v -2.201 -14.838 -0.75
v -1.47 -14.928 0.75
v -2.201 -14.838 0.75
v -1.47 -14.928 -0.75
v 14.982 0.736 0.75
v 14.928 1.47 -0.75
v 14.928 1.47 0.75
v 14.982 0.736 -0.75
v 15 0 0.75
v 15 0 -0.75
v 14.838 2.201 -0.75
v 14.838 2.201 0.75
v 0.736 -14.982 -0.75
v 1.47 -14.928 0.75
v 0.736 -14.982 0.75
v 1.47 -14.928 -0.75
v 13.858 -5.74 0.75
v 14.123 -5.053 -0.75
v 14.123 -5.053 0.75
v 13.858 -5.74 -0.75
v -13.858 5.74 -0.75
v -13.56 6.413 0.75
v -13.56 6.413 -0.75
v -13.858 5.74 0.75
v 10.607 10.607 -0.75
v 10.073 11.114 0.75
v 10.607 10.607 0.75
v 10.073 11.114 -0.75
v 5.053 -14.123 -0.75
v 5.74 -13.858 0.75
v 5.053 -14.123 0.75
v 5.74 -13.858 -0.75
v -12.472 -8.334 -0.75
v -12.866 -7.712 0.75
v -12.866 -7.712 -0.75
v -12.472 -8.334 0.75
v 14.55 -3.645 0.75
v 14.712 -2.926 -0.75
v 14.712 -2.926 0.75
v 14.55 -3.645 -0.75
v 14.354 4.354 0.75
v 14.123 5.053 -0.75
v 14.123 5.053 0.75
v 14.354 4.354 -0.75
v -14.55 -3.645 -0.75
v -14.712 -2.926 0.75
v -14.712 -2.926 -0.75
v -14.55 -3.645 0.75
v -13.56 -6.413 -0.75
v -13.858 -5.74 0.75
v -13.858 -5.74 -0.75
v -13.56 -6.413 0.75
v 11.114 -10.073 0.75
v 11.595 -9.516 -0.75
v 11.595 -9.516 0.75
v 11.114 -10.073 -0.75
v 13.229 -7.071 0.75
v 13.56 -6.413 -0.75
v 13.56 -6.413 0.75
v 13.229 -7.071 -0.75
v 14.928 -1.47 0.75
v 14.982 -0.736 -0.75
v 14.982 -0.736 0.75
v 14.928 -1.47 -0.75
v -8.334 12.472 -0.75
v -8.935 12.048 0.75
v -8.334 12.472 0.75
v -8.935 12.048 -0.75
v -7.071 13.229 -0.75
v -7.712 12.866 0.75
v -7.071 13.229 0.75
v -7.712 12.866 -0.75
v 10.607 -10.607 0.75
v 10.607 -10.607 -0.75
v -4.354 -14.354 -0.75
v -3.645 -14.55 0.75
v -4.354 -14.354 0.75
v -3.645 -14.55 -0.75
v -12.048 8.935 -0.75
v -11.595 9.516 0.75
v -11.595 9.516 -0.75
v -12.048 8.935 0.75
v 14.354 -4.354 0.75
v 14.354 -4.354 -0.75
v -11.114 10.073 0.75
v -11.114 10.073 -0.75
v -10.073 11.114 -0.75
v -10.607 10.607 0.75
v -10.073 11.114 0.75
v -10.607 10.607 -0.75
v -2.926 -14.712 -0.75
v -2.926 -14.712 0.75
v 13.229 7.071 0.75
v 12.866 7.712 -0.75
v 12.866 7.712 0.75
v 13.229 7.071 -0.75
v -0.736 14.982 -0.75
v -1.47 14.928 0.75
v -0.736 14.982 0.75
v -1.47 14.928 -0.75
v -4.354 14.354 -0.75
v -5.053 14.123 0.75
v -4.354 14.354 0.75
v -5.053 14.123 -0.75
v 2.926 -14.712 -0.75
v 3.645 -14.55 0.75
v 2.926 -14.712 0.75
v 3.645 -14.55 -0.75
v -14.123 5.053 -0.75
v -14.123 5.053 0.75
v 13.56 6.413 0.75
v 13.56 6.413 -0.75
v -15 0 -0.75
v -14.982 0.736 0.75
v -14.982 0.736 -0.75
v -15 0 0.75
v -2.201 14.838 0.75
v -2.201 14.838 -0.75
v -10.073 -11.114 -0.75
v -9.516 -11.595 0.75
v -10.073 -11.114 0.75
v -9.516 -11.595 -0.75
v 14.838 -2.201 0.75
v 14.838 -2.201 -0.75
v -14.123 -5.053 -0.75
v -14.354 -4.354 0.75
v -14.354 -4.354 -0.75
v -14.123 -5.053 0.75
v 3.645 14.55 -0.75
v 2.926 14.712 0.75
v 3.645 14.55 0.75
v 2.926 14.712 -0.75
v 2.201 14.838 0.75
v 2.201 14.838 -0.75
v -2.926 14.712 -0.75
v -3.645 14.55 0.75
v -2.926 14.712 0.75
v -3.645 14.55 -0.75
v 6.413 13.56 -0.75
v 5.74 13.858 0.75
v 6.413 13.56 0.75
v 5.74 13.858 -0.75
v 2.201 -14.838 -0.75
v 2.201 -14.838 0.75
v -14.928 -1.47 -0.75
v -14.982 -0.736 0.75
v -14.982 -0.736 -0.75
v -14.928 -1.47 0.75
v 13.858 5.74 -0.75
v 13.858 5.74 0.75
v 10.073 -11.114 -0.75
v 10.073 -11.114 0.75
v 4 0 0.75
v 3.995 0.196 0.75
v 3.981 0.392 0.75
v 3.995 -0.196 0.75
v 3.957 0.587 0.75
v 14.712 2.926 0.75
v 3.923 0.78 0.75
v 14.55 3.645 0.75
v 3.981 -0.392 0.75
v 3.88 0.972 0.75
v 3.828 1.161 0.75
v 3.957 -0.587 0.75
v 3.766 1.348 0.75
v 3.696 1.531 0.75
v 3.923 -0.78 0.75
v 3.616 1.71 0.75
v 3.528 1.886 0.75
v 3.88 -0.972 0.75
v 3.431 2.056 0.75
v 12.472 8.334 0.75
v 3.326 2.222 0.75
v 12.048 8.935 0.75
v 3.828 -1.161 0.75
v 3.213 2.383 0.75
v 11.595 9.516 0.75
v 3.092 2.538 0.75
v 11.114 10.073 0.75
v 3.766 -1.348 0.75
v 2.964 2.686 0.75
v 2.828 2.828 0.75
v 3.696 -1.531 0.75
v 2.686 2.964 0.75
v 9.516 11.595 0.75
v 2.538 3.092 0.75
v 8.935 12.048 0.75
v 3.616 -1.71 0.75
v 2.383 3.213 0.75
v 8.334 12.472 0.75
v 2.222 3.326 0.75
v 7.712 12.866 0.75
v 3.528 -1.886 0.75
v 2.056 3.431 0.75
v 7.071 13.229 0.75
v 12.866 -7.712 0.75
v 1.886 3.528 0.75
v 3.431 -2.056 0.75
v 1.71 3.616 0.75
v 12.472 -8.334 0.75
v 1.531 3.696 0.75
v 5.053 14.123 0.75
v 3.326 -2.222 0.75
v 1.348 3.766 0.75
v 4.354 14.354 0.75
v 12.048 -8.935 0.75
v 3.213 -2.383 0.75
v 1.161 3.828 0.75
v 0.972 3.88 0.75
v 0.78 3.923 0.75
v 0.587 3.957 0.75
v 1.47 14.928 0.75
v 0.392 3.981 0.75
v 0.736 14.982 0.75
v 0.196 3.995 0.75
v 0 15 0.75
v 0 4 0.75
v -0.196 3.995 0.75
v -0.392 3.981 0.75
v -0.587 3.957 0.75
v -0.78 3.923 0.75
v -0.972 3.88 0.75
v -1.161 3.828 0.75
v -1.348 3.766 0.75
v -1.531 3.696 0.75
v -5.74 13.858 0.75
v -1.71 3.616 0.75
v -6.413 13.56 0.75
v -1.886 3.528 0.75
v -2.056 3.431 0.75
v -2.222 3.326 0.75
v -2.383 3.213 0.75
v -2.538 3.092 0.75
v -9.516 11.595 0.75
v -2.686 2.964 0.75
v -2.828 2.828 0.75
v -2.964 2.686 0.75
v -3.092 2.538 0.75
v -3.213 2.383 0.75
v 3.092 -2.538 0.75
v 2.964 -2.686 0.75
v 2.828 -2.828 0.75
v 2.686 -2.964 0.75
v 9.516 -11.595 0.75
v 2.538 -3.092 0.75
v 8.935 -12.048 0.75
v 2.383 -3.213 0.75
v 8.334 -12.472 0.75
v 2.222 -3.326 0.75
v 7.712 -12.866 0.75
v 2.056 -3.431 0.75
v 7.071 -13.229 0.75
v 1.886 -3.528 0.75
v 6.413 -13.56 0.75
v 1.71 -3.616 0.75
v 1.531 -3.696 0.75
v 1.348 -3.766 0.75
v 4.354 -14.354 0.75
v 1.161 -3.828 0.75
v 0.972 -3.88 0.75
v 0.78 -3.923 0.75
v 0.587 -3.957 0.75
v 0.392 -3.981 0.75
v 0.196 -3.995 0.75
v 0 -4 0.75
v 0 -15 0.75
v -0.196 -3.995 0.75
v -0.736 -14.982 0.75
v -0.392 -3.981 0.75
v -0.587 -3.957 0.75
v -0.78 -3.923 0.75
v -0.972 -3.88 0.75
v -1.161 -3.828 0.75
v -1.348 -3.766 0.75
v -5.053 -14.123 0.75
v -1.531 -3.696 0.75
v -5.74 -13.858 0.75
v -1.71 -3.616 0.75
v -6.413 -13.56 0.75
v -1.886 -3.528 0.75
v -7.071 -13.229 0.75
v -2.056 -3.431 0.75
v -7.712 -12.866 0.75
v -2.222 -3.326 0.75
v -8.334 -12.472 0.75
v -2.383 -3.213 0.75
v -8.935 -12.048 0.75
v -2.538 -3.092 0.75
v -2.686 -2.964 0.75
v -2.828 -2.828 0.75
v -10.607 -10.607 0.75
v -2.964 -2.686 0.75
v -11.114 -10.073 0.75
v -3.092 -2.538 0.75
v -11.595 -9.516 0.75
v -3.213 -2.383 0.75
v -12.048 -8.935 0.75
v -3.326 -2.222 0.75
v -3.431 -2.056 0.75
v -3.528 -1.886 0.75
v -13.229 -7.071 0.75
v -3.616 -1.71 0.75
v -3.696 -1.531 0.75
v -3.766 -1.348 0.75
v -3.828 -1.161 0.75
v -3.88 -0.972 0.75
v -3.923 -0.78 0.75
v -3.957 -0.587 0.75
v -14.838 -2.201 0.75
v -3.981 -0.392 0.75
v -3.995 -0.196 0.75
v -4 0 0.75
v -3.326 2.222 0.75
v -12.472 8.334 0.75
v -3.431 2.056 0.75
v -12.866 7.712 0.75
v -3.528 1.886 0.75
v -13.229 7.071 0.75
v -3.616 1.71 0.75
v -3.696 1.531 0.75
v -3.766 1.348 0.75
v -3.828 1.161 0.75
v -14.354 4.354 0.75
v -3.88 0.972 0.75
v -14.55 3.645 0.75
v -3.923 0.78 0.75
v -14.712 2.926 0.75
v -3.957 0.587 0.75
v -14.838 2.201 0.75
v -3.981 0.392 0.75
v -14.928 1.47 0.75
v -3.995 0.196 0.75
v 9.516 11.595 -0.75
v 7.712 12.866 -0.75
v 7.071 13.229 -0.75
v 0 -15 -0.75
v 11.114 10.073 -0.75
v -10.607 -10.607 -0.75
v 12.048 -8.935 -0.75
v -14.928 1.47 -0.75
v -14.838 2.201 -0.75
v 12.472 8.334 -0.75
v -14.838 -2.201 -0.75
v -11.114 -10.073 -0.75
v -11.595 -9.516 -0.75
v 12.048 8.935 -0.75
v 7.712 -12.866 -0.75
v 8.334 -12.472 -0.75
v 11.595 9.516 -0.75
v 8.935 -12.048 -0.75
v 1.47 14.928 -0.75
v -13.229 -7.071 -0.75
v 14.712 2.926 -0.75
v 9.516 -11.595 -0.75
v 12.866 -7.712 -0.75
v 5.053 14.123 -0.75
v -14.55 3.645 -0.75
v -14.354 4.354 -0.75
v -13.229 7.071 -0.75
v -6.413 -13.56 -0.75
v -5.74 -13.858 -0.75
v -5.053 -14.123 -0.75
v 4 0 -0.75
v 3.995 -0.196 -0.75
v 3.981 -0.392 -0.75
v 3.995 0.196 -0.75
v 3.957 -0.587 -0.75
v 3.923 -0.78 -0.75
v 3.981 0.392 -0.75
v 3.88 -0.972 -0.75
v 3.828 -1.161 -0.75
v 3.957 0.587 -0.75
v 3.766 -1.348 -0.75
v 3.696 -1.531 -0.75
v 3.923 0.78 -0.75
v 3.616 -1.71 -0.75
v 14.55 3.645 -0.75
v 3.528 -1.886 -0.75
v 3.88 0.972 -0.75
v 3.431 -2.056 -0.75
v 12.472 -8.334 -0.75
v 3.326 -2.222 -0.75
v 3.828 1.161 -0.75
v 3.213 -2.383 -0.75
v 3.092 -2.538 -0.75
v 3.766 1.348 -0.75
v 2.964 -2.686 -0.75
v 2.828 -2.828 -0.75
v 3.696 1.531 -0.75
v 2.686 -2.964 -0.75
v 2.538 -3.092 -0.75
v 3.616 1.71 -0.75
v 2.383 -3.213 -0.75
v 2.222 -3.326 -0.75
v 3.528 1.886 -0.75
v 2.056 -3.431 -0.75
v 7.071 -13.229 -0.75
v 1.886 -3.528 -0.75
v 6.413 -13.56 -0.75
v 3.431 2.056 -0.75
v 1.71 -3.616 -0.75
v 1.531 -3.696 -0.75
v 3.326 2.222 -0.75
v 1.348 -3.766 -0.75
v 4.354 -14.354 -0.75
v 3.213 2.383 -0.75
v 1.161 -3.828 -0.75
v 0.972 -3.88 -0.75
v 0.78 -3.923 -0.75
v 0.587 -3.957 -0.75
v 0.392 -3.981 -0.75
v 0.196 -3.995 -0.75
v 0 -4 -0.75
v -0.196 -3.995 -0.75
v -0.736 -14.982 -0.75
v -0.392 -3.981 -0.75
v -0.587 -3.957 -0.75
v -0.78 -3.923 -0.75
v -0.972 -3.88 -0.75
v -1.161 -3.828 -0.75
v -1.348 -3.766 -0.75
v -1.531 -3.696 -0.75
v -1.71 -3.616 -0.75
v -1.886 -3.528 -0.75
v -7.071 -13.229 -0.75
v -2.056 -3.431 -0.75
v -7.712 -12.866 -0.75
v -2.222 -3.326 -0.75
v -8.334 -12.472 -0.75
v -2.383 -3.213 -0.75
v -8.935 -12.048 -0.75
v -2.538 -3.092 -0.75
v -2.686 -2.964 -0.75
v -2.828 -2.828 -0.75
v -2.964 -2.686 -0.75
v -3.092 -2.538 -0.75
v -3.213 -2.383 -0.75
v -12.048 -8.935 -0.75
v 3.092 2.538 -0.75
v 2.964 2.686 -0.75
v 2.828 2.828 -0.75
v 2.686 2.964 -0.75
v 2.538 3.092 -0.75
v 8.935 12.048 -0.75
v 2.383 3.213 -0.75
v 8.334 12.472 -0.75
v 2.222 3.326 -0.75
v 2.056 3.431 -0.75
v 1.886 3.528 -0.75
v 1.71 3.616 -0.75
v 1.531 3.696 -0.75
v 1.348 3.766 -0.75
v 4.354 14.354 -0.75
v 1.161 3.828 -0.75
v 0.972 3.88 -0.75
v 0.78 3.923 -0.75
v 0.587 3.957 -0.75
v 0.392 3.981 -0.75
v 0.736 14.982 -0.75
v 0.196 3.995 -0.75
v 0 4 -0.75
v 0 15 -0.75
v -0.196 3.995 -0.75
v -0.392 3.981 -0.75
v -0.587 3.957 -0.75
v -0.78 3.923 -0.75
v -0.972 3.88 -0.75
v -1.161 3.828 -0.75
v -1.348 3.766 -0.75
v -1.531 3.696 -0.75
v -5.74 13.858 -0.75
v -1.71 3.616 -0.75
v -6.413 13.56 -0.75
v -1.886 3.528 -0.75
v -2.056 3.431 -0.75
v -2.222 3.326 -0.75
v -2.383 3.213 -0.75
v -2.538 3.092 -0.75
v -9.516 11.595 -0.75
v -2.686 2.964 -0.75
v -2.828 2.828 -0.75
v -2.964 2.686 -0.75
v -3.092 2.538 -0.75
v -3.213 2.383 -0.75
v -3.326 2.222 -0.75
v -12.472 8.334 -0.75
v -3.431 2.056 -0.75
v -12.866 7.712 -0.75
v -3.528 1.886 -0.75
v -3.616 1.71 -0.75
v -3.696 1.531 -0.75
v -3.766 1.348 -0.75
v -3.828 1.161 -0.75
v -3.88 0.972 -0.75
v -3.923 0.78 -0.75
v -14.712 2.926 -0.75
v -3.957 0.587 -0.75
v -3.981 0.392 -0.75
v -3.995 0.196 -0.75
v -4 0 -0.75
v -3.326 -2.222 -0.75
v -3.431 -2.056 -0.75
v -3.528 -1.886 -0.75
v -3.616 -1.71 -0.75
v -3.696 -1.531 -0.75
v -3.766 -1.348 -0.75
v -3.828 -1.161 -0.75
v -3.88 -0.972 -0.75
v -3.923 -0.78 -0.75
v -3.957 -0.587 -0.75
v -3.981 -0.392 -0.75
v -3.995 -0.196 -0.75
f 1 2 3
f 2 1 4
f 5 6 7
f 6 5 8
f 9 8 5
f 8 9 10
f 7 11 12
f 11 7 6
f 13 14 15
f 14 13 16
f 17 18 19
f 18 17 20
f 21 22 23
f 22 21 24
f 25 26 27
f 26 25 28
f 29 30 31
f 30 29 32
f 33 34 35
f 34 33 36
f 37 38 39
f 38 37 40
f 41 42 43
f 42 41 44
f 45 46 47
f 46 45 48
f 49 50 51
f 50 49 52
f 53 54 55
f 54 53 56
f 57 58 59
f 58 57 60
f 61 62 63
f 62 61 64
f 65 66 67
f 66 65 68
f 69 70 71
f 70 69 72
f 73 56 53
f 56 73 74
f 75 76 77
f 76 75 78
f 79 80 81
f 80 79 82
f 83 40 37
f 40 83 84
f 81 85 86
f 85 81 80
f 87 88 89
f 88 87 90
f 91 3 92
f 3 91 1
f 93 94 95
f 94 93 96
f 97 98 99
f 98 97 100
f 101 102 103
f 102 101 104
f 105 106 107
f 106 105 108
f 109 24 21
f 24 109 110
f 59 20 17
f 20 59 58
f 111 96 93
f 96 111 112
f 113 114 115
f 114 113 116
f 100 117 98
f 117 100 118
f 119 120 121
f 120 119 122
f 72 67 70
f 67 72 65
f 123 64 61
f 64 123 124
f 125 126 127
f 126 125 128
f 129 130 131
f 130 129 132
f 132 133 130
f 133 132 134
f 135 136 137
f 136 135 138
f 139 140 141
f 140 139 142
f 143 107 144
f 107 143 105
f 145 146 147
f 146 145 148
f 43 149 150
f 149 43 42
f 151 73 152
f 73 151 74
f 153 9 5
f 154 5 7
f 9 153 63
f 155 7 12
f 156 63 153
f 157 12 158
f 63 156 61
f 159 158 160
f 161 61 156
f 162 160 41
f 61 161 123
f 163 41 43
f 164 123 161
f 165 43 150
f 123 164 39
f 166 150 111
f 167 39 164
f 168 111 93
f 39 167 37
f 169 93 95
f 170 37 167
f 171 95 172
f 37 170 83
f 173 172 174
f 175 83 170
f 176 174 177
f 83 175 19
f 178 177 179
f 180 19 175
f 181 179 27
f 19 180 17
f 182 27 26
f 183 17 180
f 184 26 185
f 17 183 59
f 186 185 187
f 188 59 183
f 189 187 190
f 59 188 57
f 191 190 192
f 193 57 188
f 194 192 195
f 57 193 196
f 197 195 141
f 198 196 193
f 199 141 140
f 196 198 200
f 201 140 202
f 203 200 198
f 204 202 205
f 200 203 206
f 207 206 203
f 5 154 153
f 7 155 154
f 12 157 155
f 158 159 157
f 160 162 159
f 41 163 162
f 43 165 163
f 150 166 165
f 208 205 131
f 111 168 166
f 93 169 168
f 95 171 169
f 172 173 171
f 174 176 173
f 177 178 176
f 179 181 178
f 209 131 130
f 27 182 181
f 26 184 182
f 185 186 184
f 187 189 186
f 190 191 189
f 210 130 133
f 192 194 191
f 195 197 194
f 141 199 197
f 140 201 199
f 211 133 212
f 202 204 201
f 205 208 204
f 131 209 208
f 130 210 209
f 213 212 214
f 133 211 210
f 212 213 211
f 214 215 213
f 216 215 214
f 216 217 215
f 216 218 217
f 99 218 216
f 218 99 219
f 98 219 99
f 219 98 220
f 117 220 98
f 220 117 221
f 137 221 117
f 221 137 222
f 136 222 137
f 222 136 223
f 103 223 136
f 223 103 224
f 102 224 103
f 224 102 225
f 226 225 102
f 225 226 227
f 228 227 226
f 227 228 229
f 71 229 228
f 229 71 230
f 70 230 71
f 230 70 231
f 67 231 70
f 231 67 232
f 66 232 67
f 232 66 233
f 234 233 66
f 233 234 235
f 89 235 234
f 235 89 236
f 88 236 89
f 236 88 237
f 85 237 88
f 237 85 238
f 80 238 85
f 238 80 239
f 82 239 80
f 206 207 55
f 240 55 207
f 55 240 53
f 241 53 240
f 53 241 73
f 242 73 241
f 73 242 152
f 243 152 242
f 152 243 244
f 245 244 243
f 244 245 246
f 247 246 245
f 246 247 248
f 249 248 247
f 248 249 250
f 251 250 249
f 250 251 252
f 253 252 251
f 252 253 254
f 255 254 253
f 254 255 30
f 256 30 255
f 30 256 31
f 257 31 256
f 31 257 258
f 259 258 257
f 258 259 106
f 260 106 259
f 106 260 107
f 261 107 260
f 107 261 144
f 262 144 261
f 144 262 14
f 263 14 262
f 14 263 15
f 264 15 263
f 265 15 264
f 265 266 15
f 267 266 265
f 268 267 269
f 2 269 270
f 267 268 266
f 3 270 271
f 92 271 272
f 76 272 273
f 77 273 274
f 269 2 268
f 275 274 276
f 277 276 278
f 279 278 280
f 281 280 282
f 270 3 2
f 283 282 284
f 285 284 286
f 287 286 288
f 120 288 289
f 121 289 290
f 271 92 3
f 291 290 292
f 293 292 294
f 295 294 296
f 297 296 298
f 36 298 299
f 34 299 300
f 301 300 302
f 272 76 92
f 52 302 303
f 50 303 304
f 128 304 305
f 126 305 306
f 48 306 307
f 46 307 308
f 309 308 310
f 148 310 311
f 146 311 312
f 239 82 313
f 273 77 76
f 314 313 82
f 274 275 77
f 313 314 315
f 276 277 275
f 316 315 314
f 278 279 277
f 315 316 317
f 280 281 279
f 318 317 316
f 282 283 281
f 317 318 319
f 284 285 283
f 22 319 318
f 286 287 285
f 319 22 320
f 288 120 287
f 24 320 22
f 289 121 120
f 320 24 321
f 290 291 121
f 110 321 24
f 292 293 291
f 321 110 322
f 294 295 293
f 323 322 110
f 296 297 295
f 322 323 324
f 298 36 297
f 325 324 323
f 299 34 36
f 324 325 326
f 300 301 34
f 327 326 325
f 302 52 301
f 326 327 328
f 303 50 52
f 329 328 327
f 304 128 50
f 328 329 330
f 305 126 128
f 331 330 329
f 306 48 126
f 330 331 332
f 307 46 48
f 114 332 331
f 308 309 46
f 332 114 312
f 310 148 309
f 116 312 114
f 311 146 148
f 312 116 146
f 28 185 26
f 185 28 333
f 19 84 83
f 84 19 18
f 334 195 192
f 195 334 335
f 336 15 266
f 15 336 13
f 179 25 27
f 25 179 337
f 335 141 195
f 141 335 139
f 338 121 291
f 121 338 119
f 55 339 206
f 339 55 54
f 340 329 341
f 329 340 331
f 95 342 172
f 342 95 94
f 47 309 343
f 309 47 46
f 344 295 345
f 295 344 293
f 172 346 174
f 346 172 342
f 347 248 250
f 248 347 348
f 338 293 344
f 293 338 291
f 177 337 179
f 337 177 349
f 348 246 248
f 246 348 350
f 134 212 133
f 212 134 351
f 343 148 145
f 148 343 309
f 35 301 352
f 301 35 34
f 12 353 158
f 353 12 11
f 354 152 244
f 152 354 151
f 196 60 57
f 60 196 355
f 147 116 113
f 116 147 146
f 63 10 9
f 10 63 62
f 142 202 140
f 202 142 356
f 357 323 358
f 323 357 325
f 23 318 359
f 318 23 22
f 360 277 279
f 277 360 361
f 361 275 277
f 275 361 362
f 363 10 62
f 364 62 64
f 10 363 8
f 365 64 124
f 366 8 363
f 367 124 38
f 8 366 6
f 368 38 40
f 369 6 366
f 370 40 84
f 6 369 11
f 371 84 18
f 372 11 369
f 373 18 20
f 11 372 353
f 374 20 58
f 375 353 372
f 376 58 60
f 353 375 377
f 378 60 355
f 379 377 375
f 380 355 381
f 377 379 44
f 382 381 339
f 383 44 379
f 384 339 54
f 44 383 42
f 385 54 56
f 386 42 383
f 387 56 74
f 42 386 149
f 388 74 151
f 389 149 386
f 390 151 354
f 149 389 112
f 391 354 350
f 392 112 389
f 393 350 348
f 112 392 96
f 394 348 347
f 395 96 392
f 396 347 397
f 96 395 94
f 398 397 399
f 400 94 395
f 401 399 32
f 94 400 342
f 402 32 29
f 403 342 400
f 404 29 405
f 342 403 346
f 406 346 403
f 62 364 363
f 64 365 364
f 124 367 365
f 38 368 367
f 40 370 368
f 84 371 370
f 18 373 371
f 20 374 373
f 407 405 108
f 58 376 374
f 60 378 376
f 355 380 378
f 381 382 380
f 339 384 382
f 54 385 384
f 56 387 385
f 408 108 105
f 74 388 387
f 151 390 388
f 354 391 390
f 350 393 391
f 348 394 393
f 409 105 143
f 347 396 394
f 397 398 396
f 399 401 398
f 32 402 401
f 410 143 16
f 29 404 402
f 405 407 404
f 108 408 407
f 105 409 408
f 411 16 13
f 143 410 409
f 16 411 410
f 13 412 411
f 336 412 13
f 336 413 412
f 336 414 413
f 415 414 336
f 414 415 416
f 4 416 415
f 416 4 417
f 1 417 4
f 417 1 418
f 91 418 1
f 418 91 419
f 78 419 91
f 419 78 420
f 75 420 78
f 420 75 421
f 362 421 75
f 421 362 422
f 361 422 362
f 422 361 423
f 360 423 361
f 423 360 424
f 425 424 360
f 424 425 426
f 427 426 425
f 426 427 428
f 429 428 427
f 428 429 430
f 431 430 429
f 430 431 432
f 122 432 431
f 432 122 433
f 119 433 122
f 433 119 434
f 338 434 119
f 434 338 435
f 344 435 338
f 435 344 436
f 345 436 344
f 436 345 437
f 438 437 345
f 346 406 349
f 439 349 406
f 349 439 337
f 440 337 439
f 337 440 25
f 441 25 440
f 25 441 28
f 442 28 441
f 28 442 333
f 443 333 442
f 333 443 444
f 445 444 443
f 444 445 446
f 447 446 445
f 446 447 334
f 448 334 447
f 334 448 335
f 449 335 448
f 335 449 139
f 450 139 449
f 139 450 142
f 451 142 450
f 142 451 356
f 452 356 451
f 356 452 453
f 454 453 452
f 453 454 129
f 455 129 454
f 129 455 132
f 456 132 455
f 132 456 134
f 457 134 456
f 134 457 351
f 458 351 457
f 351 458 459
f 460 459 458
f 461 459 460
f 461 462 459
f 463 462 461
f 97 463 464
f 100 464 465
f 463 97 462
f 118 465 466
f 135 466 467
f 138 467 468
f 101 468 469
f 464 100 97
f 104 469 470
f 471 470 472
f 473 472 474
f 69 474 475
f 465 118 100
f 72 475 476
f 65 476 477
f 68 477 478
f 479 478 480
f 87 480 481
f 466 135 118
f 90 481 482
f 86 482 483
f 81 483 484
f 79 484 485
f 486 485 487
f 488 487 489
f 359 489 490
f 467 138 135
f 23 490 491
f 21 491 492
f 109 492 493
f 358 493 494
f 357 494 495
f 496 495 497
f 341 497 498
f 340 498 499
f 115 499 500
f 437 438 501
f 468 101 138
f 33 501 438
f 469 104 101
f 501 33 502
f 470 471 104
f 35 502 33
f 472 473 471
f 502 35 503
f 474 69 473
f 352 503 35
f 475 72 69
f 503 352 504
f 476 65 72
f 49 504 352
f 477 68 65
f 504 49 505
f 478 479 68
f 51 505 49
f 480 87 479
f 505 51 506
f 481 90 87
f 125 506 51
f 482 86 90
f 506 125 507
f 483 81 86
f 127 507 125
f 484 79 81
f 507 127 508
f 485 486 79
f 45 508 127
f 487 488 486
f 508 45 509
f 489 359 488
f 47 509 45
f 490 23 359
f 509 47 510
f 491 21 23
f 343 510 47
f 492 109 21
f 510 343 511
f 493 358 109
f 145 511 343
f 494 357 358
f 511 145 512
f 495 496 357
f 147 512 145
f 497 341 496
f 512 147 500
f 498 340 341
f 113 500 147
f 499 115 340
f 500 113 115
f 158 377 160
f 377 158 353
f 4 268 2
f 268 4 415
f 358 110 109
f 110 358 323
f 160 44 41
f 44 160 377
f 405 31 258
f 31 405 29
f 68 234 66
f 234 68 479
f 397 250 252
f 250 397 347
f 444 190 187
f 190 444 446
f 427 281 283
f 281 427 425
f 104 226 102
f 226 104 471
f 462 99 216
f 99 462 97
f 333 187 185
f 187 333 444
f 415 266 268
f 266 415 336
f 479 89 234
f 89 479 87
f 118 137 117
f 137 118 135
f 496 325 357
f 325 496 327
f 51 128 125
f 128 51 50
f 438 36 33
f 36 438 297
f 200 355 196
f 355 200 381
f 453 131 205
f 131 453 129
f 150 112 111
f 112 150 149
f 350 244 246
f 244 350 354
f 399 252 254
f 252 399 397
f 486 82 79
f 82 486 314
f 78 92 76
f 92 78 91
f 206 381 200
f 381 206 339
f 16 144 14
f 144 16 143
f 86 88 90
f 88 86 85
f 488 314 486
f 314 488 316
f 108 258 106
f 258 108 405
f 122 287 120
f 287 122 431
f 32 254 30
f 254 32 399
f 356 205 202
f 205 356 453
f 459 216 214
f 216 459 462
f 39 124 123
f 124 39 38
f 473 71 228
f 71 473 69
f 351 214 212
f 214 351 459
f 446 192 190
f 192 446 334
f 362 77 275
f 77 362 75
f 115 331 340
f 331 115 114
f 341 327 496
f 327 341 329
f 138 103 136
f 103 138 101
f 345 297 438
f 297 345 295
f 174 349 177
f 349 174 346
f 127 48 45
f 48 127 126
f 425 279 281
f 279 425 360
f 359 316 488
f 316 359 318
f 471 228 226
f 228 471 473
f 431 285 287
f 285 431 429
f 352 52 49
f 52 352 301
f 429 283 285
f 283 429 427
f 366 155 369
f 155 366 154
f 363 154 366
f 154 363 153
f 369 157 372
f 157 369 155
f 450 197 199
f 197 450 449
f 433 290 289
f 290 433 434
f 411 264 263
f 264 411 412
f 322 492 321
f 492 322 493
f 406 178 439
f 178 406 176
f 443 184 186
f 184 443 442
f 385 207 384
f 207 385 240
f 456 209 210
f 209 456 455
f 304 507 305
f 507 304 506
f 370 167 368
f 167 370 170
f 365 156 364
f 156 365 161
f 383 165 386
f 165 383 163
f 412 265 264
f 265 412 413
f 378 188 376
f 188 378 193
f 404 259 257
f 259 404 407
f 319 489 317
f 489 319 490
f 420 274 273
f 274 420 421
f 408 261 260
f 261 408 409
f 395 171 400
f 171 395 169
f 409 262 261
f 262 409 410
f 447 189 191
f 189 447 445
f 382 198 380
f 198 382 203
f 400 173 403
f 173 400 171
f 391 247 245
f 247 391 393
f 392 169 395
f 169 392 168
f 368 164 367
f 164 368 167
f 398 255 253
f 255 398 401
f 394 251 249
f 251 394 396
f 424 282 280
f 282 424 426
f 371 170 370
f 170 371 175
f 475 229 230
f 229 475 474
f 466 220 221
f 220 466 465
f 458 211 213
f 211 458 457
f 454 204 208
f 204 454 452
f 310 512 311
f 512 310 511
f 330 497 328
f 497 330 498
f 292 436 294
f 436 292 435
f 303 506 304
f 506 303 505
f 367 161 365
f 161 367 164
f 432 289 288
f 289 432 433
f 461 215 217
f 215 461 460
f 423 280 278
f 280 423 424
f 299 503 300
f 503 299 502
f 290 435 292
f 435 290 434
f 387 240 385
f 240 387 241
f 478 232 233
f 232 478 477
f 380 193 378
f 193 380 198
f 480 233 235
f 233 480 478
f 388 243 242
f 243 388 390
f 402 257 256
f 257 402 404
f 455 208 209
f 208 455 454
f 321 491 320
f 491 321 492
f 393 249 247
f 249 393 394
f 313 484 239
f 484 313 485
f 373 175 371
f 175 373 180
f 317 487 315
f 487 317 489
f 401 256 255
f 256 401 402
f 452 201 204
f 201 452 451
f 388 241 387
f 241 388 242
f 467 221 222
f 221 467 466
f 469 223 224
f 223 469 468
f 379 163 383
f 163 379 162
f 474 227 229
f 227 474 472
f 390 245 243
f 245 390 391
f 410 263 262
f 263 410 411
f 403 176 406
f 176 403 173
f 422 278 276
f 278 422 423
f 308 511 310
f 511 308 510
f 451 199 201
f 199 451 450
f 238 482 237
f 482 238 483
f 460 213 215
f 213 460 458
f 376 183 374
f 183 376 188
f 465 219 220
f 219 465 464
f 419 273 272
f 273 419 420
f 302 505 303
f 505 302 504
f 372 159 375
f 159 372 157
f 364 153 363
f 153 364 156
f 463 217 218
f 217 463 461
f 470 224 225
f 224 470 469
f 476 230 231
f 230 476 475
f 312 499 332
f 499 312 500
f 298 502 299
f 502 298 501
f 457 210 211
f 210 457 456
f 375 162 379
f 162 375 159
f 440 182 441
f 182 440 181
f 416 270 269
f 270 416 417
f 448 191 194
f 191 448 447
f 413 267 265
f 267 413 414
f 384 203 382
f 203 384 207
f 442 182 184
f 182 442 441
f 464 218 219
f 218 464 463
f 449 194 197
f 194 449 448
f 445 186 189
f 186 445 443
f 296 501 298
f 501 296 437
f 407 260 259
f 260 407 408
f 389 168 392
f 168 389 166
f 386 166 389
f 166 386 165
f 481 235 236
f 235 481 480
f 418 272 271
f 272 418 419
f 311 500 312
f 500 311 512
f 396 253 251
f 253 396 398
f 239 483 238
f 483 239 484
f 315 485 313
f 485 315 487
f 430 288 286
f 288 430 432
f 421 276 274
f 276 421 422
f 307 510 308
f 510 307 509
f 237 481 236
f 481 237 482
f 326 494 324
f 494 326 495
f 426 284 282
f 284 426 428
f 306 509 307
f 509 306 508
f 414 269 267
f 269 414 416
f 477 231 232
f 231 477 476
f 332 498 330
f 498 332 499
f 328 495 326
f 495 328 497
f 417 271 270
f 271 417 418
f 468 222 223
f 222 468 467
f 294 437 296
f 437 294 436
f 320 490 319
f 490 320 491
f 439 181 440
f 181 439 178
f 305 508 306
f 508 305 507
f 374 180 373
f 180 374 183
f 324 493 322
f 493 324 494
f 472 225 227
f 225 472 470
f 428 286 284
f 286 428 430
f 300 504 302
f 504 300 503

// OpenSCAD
$fn=128;

module penny_washer(od=30.0, id=8.0, thickness=1.5) {
    difference() {
        cylinder(d=od, h=thickness, center=true);
        cylinder(d=id, h=thickness+0.2, center=true);
    }
}

penny_washer();
